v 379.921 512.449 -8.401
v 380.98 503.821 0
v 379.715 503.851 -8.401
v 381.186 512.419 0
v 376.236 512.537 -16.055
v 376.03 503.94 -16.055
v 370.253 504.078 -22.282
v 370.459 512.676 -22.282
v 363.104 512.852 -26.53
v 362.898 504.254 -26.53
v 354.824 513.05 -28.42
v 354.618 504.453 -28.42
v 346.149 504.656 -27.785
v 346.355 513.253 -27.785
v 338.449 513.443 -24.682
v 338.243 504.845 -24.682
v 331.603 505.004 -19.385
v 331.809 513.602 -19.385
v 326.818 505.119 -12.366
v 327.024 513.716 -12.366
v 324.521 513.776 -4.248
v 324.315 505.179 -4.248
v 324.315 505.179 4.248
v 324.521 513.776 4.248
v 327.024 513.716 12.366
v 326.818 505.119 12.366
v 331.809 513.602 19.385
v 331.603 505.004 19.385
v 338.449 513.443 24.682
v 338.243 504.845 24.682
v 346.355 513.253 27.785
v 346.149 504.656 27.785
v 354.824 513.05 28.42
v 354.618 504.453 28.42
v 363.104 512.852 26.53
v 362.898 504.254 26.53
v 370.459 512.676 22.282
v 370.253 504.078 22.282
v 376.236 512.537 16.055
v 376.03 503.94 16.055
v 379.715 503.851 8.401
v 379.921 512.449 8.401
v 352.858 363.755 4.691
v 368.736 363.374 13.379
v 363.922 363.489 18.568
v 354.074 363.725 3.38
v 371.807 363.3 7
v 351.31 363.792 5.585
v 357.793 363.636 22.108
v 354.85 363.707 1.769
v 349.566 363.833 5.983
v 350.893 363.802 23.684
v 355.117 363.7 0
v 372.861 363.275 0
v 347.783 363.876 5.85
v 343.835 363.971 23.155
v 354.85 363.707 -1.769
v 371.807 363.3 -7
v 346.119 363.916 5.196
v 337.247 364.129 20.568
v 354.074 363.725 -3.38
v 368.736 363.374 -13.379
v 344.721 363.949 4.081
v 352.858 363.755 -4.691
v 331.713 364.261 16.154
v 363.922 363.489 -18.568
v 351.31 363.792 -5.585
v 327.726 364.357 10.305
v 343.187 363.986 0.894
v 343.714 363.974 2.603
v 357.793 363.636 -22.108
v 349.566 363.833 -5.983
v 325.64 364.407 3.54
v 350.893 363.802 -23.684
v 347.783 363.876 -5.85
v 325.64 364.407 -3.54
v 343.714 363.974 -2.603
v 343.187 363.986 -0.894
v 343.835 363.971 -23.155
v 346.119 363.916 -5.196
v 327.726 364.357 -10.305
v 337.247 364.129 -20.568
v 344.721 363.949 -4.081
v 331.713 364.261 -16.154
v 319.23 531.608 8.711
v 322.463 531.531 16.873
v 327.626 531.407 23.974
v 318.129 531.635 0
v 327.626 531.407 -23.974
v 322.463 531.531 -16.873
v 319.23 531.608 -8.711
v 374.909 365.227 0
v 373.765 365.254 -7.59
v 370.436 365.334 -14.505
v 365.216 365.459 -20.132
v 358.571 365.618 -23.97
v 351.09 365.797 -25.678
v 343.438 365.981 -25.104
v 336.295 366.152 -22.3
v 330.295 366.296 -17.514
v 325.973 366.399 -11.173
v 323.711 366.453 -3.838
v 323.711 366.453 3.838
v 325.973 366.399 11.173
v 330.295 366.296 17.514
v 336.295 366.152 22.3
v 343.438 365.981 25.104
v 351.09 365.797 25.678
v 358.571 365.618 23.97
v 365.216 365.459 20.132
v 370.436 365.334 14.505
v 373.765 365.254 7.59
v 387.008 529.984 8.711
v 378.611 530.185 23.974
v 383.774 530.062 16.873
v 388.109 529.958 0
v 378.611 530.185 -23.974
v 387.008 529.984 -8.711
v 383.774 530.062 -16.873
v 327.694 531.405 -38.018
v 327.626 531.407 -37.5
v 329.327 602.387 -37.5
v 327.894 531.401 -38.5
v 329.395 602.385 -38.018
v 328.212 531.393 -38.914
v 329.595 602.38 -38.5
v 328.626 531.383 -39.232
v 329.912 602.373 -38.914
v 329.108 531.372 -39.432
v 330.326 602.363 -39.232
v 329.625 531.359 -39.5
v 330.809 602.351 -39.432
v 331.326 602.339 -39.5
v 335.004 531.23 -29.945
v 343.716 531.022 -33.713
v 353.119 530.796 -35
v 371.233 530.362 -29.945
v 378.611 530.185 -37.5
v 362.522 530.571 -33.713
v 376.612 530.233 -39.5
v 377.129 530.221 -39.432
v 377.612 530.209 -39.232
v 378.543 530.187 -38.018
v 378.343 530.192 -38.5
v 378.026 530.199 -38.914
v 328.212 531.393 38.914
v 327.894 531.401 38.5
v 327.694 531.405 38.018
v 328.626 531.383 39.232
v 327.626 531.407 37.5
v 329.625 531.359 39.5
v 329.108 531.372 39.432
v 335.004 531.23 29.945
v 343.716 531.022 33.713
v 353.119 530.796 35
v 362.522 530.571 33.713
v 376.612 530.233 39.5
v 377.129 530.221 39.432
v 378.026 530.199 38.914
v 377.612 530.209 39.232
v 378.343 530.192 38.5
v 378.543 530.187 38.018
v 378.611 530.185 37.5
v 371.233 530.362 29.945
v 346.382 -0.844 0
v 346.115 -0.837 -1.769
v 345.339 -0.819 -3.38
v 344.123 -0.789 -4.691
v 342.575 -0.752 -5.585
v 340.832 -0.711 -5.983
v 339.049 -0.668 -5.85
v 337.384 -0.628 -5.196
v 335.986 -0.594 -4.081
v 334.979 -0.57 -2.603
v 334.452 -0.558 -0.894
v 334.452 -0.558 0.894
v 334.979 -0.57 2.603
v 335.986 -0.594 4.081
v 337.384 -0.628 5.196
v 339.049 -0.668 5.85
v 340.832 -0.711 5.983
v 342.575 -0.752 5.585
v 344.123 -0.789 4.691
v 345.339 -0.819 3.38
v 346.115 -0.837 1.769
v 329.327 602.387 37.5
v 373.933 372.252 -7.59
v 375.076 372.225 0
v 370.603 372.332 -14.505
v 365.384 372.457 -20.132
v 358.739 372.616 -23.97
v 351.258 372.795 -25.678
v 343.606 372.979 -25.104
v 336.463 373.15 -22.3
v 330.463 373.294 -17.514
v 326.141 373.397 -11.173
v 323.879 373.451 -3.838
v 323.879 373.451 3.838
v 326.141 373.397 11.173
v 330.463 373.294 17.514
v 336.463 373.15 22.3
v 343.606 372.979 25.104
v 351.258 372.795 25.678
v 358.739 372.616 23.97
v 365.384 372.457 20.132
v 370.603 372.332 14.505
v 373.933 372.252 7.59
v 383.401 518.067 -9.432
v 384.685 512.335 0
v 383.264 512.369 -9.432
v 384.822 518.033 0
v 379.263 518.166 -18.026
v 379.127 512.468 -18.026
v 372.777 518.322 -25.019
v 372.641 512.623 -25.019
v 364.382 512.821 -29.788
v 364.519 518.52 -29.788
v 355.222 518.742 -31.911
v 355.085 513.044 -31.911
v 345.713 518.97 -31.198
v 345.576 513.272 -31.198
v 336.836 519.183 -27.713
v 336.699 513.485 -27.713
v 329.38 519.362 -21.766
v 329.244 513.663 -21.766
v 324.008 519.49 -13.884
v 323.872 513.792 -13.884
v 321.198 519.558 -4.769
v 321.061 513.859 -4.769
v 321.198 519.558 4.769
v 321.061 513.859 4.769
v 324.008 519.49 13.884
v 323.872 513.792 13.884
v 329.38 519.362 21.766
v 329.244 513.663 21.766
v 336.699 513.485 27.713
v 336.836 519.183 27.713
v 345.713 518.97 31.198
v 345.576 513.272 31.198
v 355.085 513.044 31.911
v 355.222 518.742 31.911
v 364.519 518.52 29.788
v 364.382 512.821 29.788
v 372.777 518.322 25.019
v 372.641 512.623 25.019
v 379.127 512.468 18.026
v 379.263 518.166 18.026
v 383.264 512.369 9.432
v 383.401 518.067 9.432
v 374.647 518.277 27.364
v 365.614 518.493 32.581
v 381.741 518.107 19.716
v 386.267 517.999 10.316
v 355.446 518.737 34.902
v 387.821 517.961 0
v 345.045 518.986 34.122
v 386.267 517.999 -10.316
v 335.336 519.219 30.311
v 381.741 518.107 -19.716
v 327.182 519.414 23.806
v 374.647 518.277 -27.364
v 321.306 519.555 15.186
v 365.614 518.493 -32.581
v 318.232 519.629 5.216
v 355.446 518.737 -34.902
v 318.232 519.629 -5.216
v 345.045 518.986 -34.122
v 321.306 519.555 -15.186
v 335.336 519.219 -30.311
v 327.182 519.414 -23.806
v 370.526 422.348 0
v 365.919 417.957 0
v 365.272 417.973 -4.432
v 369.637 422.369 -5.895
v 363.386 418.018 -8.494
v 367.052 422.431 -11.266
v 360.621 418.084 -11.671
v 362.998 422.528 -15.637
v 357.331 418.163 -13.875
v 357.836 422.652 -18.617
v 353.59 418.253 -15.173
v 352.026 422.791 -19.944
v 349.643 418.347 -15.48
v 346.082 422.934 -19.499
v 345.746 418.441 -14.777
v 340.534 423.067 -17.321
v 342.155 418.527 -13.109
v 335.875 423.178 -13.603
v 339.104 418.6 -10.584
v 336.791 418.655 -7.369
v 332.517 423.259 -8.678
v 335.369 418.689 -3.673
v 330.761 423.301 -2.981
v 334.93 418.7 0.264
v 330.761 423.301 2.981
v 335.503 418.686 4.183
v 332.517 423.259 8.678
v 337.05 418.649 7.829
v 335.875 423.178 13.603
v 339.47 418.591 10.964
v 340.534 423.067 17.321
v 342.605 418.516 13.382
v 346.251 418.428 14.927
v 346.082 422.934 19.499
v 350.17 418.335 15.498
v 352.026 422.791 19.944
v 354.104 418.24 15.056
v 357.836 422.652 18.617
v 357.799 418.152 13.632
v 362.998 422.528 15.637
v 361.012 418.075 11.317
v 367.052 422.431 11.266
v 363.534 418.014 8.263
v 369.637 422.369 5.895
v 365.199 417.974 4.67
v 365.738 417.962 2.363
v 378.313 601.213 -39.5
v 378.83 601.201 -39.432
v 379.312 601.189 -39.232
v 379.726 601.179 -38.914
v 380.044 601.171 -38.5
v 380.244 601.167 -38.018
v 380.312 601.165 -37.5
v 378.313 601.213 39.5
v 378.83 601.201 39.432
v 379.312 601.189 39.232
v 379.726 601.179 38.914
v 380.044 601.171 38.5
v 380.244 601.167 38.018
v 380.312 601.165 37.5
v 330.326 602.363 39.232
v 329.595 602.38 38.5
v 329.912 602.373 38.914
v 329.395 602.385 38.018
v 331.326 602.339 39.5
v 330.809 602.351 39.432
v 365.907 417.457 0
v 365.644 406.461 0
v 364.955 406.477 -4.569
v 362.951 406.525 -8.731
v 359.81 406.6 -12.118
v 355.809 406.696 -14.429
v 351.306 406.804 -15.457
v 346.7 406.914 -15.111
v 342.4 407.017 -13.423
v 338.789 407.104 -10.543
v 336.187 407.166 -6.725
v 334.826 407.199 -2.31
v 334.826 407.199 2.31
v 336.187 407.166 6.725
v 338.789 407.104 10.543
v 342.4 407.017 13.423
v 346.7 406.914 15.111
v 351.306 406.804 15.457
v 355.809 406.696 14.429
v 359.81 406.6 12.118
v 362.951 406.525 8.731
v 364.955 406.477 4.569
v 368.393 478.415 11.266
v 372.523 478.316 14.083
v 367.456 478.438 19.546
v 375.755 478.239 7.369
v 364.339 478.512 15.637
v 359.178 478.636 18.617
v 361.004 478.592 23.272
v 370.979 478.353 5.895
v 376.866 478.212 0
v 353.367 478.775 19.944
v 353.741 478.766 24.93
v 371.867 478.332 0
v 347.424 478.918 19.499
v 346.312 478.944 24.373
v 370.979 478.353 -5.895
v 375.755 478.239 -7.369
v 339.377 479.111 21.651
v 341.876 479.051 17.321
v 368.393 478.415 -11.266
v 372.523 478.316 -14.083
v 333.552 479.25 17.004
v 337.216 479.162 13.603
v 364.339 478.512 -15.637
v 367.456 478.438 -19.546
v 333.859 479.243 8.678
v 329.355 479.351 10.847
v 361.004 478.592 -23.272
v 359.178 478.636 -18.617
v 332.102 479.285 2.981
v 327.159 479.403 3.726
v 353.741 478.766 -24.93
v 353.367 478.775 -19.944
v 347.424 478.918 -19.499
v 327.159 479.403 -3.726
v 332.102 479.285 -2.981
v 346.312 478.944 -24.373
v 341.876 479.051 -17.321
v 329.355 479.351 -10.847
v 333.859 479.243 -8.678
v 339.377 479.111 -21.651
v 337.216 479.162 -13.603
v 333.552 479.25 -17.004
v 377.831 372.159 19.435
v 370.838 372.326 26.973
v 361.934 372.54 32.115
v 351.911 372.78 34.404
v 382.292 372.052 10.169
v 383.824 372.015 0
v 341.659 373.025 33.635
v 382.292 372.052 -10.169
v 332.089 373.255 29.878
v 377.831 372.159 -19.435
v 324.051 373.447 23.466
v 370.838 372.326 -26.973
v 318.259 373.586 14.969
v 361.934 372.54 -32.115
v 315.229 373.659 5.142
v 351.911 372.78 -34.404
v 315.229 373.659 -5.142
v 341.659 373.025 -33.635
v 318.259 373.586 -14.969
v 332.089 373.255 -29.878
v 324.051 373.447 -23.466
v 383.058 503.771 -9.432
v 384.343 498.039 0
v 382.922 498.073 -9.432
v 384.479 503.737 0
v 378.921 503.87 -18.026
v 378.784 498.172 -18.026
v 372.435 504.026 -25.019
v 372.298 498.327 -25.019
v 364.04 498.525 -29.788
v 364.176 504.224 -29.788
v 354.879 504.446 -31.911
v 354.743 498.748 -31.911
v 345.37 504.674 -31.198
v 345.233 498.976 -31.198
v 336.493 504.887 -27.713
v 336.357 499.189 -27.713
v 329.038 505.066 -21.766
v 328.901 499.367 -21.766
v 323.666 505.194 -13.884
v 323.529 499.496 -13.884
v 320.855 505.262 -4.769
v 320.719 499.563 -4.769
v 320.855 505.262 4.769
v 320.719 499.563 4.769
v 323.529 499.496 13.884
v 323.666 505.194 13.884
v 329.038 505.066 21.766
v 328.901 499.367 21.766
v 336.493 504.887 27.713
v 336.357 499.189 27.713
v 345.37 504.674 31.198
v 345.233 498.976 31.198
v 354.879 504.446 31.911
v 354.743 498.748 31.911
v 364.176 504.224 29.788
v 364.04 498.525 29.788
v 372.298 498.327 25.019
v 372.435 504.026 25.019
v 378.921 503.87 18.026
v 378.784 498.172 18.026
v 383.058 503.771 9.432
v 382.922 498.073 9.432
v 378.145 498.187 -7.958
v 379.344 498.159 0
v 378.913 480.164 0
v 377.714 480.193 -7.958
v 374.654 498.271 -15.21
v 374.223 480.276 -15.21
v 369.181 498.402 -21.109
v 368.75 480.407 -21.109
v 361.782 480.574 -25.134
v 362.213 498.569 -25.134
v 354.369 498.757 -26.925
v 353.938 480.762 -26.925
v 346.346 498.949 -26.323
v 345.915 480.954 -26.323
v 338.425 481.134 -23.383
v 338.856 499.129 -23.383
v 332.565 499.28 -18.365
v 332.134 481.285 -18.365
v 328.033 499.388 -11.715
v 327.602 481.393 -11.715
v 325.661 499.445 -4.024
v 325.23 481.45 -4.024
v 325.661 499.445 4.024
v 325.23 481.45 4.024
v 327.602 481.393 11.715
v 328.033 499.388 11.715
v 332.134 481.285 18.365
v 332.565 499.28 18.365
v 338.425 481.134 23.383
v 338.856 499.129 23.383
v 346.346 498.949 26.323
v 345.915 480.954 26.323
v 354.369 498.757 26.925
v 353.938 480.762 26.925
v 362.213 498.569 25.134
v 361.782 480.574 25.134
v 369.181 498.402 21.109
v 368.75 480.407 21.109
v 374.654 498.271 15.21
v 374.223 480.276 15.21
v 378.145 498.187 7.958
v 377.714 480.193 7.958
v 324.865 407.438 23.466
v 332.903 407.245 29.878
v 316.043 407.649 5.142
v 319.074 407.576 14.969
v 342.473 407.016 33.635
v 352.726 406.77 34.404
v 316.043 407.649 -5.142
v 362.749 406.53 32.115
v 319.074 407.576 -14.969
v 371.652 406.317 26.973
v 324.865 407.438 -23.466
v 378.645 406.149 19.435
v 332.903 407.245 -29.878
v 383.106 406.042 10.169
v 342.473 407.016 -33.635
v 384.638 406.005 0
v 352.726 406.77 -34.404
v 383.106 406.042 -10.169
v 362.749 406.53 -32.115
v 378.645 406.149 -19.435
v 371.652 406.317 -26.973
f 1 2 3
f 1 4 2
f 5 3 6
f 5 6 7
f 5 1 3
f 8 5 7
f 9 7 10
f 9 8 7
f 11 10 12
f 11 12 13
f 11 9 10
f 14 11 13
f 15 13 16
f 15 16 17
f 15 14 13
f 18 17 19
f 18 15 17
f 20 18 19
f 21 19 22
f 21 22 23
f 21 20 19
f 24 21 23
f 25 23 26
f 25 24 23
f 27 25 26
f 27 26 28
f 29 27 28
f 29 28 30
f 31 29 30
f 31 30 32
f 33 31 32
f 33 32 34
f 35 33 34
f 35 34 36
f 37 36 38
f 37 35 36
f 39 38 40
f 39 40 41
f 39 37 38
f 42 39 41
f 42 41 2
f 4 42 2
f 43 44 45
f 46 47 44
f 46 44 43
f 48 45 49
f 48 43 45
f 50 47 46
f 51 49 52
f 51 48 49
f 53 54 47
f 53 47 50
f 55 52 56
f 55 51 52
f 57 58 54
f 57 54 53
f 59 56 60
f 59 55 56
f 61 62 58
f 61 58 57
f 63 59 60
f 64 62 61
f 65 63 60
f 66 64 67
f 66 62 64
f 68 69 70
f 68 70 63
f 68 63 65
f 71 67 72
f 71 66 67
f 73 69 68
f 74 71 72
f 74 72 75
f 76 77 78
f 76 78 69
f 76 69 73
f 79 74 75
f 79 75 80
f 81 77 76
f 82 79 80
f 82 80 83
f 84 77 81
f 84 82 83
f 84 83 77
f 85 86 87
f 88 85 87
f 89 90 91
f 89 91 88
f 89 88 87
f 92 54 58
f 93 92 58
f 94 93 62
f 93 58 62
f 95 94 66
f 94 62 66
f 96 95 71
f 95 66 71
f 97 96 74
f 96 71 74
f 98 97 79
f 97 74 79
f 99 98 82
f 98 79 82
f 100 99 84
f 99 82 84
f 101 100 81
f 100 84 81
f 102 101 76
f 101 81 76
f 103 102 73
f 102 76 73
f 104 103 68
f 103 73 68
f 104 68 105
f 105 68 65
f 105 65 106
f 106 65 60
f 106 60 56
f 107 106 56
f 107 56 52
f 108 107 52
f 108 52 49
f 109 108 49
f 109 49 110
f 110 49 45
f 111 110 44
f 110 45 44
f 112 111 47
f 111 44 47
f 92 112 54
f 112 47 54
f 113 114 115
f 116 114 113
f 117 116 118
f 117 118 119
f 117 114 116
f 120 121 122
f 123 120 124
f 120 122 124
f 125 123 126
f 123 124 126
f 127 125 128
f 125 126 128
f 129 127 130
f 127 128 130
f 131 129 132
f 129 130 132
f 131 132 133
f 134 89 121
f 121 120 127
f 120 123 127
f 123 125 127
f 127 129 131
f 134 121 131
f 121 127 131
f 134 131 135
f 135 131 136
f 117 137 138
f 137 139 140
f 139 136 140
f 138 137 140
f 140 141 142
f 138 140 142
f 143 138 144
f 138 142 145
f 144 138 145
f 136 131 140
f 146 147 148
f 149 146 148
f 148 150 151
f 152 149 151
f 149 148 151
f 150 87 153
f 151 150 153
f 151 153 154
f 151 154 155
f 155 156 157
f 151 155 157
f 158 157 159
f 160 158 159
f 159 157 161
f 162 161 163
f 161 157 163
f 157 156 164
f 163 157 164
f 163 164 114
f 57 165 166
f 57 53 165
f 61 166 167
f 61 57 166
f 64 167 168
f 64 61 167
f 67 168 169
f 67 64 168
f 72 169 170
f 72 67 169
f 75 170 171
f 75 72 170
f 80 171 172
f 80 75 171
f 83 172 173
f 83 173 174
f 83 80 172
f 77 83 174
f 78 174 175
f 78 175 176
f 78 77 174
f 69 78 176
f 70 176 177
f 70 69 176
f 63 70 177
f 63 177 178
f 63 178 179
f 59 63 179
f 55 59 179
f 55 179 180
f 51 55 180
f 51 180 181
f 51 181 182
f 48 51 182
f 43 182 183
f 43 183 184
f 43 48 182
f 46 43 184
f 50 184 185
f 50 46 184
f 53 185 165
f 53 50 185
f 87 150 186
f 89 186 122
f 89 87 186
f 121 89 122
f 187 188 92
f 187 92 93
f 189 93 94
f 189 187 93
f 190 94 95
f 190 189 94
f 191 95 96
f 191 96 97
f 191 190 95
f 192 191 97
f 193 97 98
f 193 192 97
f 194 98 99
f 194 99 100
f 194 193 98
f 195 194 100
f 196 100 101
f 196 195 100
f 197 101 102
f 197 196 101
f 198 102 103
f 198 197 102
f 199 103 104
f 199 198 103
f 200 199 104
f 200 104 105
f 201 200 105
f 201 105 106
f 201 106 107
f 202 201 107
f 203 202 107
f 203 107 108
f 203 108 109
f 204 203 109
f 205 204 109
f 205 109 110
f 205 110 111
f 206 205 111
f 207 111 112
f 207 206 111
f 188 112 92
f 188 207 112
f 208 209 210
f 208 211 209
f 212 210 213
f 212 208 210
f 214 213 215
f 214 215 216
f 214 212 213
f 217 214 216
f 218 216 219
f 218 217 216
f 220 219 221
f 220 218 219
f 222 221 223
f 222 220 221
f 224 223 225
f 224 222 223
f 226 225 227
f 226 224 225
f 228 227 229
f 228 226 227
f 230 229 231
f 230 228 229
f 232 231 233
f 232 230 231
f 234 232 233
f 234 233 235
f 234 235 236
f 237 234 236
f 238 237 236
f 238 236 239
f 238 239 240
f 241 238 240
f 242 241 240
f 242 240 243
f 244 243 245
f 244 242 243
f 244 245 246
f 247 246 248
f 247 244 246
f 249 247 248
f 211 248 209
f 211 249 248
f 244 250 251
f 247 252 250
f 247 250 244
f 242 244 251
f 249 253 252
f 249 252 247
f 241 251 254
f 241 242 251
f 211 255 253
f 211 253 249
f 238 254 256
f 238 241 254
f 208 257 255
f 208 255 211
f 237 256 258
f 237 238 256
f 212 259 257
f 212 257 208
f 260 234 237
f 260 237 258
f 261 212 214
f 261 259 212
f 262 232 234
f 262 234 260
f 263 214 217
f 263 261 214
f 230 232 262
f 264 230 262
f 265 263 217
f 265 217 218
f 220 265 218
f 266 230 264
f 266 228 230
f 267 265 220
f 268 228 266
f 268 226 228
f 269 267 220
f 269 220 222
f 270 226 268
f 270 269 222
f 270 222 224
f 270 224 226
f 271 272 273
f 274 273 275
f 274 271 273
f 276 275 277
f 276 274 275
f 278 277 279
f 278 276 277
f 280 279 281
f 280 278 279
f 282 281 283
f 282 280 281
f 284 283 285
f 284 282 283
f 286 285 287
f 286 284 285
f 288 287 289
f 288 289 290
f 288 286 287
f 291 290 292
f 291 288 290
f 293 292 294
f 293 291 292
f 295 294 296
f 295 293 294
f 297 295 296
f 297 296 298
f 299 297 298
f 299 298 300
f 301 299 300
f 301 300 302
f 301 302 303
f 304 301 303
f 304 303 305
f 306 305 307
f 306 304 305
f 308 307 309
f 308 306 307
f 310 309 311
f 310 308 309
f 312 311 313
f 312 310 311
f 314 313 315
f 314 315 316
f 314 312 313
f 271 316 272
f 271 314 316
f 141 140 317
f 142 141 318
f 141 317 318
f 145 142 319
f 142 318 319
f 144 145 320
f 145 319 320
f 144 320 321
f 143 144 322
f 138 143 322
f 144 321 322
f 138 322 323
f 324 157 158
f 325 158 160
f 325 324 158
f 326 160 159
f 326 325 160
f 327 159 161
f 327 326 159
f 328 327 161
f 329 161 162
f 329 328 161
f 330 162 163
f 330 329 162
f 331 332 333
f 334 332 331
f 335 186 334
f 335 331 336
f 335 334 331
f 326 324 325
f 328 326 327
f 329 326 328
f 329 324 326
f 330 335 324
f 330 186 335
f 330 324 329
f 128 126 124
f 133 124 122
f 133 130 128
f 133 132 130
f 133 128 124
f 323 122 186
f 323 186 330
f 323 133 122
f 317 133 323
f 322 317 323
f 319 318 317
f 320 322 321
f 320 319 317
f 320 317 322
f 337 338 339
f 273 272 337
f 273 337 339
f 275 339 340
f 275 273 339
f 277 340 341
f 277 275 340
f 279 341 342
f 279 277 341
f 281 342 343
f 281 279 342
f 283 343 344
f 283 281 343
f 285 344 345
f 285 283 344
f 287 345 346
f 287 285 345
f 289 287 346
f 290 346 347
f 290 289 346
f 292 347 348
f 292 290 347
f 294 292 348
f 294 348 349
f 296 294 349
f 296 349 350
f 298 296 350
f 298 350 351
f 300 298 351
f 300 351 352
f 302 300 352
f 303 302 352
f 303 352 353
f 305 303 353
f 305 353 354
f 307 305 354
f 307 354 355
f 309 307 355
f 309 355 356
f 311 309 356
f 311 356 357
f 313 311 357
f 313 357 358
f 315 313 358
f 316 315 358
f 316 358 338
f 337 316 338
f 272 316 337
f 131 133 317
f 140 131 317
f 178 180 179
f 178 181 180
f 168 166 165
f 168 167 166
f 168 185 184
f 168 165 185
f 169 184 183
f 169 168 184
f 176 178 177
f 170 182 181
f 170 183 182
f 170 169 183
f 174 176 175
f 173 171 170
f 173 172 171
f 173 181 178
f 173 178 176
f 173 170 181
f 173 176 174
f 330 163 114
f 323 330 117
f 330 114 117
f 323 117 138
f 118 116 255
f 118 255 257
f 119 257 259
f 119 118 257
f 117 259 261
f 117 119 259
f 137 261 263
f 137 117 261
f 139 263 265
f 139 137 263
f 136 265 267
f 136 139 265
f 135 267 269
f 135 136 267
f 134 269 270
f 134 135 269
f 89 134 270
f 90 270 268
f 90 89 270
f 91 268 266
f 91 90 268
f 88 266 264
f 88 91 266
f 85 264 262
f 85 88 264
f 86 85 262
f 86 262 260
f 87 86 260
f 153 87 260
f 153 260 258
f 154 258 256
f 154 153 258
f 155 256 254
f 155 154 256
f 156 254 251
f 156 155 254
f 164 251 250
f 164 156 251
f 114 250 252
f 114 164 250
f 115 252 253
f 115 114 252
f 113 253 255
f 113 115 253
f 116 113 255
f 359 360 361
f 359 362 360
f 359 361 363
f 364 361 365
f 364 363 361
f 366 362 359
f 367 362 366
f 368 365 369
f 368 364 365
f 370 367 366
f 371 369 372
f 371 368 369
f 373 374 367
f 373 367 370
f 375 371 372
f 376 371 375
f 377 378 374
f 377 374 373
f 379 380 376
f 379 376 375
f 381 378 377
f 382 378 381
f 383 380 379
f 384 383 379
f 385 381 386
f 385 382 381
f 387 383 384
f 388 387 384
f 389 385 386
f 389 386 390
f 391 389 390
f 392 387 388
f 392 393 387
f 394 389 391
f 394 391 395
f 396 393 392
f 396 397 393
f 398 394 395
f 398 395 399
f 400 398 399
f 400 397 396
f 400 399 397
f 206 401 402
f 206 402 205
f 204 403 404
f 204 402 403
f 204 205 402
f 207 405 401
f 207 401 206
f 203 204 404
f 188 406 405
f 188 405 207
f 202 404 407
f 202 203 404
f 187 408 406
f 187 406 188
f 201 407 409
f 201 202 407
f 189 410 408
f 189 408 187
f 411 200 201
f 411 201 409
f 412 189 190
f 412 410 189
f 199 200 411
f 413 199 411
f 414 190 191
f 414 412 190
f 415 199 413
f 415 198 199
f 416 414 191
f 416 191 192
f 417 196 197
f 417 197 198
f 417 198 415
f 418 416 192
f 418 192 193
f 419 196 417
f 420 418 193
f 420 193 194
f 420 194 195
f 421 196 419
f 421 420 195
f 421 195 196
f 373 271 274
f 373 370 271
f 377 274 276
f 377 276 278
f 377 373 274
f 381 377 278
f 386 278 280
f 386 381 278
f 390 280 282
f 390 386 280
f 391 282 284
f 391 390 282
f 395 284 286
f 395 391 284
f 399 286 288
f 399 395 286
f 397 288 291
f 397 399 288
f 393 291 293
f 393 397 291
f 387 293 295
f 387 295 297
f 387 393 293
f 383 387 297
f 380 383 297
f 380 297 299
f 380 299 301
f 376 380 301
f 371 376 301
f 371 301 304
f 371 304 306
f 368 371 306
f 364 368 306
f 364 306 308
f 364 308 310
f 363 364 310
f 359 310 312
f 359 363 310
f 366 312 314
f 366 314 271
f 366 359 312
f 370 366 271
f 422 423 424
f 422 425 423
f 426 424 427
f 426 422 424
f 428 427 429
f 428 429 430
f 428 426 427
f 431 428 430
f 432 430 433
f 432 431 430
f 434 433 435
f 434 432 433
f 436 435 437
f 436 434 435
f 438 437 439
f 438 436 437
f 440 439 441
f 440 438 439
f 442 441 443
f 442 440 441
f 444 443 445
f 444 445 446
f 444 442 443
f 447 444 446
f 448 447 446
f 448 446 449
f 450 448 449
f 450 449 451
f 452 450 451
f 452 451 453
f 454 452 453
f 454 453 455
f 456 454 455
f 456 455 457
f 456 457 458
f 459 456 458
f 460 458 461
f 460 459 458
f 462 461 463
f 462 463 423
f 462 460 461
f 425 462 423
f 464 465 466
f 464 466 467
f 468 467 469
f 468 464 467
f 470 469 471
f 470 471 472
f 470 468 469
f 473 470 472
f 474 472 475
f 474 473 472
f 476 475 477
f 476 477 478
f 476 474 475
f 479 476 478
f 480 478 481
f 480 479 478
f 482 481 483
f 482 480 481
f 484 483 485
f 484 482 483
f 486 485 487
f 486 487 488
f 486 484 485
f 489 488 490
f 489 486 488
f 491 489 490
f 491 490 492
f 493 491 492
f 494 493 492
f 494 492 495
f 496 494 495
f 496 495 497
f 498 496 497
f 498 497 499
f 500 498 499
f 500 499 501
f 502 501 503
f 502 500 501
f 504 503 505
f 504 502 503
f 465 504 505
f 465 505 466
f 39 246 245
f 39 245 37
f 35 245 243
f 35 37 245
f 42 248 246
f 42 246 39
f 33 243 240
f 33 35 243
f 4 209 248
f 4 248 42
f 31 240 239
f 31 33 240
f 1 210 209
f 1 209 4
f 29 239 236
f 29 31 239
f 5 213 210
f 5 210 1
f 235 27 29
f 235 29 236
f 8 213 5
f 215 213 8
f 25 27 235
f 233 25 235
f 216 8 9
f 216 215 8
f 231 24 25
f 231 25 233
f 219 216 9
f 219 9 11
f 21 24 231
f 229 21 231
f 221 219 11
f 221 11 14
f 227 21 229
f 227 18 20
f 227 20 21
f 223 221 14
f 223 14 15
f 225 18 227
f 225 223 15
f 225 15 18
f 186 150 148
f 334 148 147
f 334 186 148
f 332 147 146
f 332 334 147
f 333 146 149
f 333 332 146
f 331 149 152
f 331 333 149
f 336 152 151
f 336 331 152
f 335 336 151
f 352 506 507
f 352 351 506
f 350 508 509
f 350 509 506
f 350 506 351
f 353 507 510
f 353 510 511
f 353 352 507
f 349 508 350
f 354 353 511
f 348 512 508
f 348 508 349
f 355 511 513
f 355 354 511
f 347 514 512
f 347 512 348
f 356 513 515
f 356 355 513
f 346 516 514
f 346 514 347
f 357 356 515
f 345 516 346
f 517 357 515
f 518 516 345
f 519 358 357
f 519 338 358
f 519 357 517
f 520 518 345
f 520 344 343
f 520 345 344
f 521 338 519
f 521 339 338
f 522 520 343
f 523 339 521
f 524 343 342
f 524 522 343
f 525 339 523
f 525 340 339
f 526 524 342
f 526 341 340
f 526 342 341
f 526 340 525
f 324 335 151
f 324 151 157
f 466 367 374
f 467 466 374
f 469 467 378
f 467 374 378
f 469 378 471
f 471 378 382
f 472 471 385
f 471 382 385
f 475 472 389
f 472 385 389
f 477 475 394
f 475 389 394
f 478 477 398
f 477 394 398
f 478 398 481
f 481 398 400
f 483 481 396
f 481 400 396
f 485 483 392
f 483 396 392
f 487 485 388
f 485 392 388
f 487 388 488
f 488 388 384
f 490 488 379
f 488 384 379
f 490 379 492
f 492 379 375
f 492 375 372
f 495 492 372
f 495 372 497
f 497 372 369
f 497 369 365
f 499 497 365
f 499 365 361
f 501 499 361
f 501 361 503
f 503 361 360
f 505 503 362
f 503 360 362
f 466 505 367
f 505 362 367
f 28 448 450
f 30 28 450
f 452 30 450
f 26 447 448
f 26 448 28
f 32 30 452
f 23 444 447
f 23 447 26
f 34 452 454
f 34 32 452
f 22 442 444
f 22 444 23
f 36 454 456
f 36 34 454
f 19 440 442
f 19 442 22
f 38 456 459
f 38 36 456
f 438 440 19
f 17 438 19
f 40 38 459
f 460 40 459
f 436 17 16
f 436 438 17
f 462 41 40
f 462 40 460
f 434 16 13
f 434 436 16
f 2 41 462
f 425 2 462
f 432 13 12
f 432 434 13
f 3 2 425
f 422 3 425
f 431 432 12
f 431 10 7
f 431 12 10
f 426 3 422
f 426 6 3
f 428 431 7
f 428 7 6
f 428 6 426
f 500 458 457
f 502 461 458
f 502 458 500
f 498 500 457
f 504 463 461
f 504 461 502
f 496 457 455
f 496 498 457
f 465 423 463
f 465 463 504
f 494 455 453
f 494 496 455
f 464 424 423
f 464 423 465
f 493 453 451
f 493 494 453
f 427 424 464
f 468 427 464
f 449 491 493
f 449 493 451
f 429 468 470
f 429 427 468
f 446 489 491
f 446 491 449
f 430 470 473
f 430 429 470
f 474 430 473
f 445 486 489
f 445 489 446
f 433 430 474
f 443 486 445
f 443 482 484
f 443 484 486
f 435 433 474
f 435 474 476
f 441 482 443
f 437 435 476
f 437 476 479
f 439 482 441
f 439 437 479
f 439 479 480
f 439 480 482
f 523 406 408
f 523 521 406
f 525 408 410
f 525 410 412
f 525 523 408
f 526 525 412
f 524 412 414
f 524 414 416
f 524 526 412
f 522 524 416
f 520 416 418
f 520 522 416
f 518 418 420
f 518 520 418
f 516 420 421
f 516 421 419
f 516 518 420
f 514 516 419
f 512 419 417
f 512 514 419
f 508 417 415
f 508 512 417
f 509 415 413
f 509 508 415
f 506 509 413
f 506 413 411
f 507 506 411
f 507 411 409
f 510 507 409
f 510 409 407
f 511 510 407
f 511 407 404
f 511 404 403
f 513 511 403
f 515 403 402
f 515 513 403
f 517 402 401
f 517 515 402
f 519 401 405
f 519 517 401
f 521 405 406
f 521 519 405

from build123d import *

# Parameters (mm, degrees)
CHAMFER1_SIZE       = 5
CHAMFER2_SIZE       = 2
SKETCH2_W           = 51
SKETCH2_H           = 79
BOSS_EXTRUDE1_DEPTH = 71
FILLET1_R           = 2


with BuildPart() as part:
    # Sketch1 → Revolve2 (revolve)
    with BuildSketch(Plane.XY):
        Polygon((387.82109188, 517.961255794), (388.108543141, 529.957812458), (353.118586206, 530.796211969), (340.38333201, -0.699799139), (346.381610341, -0.843524769), (355.116501156, 363.700406109), (374.860833998, 363.227309242), (375.076422443, 372.22472674), (383.823911677, 372.015126862), (384.638356916, 406.005370741), (365.643808866, 406.460501904), (365.907305855, 417.457345512), (370.406014604, 417.349551289), (371.867225181, 478.33204766), (378.865216568, 478.164367758), (379.344302003, 498.158628863), (384.342867279, 498.038857504), (384.479406628, 503.737221919), (380.980410934, 503.82106187), (381.186417671, 512.418594146), (384.685413365, 512.334754195), (384.821952714, 518.03311861), align=None)
    revolve(axis=Axis((340.38333201, -0.699799139, 0), (0.023954271746676543, 0.9997130552639024, 0)))

    # Chamfer1
    # the kernel refuses this chamfer: 5 mm, written as the material it takes off along each edge
    with BuildSketch(Plane(origin=(350.411753499, 417.828636724, 0), x_dir=(0.9997130552639024, -0.02395427174667721, 0), z_dir=(0, 0, 1))) as chamfer1_piece_1_section:
        Polygon((20 - CHAMFER1_SIZE, 0), (20, CHAMFER1_SIZE), (20, 0), align=None)
    chamfer1_piece_1 = revolve(axis=Axis((350.411753499, 417.828636724, 0), (0.023954271746676543, 0.9997130552639024, 0)), mode=Mode.PRIVATE)
    chamfer1_piece_1 = chamfer1_piece_1 - Plane(origin=(350.477356387, 420.56652265, 0), x_dir=(0.9997130552639024, -0.023954271746676543, 0), z_dir=(0.023954271746676543, 0.9997130552639024, 0)) * Cylinder(15.5, 80, mode=Mode.PRIVATE)
    add(chamfer1_piece_1, mode=Mode.SUBTRACT)

    # Chamfer2
    chamfer2_edges = [part.edges().sort_by_distance(p)[0] for p in [
        (324.880711583, 479.457898432, 0),
        (323.375611652, 364.460954237, 0),
    ]]
    chamfer(chamfer2_edges, length=CHAMFER2_SIZE)

    # Sketch2 → Boss-Extrude1 (add)
    with BuildSketch(Plane(origin=(12.913810212, 538.947908709, 0), x_dir=(0.9997130552639024, -0.023954271746676654, 0), z_dir=(0.023954271746676657, 0.9997130552639025, 0))):
        with Locations((340.302423983, 0)):
            Rectangle(SKETCH2_W, SKETCH2_H)
    extrude(amount=BOSS_EXTRUDE1_DEPTH)

    # Fillet1
    fillet1_edges = [part.edges().sort_by_distance(p)[0] for p in [
        (328.476279944, 566.89685936, -39.5),
        (328.476279944, 566.89685936, 39.5),
        (379.461645763, 565.675191501, 39.5),
        (379.461645763, 565.675191501, -39.5),
    ]]
    fillet(fillet1_edges, radius=FILLET1_R)


solid = part.part
